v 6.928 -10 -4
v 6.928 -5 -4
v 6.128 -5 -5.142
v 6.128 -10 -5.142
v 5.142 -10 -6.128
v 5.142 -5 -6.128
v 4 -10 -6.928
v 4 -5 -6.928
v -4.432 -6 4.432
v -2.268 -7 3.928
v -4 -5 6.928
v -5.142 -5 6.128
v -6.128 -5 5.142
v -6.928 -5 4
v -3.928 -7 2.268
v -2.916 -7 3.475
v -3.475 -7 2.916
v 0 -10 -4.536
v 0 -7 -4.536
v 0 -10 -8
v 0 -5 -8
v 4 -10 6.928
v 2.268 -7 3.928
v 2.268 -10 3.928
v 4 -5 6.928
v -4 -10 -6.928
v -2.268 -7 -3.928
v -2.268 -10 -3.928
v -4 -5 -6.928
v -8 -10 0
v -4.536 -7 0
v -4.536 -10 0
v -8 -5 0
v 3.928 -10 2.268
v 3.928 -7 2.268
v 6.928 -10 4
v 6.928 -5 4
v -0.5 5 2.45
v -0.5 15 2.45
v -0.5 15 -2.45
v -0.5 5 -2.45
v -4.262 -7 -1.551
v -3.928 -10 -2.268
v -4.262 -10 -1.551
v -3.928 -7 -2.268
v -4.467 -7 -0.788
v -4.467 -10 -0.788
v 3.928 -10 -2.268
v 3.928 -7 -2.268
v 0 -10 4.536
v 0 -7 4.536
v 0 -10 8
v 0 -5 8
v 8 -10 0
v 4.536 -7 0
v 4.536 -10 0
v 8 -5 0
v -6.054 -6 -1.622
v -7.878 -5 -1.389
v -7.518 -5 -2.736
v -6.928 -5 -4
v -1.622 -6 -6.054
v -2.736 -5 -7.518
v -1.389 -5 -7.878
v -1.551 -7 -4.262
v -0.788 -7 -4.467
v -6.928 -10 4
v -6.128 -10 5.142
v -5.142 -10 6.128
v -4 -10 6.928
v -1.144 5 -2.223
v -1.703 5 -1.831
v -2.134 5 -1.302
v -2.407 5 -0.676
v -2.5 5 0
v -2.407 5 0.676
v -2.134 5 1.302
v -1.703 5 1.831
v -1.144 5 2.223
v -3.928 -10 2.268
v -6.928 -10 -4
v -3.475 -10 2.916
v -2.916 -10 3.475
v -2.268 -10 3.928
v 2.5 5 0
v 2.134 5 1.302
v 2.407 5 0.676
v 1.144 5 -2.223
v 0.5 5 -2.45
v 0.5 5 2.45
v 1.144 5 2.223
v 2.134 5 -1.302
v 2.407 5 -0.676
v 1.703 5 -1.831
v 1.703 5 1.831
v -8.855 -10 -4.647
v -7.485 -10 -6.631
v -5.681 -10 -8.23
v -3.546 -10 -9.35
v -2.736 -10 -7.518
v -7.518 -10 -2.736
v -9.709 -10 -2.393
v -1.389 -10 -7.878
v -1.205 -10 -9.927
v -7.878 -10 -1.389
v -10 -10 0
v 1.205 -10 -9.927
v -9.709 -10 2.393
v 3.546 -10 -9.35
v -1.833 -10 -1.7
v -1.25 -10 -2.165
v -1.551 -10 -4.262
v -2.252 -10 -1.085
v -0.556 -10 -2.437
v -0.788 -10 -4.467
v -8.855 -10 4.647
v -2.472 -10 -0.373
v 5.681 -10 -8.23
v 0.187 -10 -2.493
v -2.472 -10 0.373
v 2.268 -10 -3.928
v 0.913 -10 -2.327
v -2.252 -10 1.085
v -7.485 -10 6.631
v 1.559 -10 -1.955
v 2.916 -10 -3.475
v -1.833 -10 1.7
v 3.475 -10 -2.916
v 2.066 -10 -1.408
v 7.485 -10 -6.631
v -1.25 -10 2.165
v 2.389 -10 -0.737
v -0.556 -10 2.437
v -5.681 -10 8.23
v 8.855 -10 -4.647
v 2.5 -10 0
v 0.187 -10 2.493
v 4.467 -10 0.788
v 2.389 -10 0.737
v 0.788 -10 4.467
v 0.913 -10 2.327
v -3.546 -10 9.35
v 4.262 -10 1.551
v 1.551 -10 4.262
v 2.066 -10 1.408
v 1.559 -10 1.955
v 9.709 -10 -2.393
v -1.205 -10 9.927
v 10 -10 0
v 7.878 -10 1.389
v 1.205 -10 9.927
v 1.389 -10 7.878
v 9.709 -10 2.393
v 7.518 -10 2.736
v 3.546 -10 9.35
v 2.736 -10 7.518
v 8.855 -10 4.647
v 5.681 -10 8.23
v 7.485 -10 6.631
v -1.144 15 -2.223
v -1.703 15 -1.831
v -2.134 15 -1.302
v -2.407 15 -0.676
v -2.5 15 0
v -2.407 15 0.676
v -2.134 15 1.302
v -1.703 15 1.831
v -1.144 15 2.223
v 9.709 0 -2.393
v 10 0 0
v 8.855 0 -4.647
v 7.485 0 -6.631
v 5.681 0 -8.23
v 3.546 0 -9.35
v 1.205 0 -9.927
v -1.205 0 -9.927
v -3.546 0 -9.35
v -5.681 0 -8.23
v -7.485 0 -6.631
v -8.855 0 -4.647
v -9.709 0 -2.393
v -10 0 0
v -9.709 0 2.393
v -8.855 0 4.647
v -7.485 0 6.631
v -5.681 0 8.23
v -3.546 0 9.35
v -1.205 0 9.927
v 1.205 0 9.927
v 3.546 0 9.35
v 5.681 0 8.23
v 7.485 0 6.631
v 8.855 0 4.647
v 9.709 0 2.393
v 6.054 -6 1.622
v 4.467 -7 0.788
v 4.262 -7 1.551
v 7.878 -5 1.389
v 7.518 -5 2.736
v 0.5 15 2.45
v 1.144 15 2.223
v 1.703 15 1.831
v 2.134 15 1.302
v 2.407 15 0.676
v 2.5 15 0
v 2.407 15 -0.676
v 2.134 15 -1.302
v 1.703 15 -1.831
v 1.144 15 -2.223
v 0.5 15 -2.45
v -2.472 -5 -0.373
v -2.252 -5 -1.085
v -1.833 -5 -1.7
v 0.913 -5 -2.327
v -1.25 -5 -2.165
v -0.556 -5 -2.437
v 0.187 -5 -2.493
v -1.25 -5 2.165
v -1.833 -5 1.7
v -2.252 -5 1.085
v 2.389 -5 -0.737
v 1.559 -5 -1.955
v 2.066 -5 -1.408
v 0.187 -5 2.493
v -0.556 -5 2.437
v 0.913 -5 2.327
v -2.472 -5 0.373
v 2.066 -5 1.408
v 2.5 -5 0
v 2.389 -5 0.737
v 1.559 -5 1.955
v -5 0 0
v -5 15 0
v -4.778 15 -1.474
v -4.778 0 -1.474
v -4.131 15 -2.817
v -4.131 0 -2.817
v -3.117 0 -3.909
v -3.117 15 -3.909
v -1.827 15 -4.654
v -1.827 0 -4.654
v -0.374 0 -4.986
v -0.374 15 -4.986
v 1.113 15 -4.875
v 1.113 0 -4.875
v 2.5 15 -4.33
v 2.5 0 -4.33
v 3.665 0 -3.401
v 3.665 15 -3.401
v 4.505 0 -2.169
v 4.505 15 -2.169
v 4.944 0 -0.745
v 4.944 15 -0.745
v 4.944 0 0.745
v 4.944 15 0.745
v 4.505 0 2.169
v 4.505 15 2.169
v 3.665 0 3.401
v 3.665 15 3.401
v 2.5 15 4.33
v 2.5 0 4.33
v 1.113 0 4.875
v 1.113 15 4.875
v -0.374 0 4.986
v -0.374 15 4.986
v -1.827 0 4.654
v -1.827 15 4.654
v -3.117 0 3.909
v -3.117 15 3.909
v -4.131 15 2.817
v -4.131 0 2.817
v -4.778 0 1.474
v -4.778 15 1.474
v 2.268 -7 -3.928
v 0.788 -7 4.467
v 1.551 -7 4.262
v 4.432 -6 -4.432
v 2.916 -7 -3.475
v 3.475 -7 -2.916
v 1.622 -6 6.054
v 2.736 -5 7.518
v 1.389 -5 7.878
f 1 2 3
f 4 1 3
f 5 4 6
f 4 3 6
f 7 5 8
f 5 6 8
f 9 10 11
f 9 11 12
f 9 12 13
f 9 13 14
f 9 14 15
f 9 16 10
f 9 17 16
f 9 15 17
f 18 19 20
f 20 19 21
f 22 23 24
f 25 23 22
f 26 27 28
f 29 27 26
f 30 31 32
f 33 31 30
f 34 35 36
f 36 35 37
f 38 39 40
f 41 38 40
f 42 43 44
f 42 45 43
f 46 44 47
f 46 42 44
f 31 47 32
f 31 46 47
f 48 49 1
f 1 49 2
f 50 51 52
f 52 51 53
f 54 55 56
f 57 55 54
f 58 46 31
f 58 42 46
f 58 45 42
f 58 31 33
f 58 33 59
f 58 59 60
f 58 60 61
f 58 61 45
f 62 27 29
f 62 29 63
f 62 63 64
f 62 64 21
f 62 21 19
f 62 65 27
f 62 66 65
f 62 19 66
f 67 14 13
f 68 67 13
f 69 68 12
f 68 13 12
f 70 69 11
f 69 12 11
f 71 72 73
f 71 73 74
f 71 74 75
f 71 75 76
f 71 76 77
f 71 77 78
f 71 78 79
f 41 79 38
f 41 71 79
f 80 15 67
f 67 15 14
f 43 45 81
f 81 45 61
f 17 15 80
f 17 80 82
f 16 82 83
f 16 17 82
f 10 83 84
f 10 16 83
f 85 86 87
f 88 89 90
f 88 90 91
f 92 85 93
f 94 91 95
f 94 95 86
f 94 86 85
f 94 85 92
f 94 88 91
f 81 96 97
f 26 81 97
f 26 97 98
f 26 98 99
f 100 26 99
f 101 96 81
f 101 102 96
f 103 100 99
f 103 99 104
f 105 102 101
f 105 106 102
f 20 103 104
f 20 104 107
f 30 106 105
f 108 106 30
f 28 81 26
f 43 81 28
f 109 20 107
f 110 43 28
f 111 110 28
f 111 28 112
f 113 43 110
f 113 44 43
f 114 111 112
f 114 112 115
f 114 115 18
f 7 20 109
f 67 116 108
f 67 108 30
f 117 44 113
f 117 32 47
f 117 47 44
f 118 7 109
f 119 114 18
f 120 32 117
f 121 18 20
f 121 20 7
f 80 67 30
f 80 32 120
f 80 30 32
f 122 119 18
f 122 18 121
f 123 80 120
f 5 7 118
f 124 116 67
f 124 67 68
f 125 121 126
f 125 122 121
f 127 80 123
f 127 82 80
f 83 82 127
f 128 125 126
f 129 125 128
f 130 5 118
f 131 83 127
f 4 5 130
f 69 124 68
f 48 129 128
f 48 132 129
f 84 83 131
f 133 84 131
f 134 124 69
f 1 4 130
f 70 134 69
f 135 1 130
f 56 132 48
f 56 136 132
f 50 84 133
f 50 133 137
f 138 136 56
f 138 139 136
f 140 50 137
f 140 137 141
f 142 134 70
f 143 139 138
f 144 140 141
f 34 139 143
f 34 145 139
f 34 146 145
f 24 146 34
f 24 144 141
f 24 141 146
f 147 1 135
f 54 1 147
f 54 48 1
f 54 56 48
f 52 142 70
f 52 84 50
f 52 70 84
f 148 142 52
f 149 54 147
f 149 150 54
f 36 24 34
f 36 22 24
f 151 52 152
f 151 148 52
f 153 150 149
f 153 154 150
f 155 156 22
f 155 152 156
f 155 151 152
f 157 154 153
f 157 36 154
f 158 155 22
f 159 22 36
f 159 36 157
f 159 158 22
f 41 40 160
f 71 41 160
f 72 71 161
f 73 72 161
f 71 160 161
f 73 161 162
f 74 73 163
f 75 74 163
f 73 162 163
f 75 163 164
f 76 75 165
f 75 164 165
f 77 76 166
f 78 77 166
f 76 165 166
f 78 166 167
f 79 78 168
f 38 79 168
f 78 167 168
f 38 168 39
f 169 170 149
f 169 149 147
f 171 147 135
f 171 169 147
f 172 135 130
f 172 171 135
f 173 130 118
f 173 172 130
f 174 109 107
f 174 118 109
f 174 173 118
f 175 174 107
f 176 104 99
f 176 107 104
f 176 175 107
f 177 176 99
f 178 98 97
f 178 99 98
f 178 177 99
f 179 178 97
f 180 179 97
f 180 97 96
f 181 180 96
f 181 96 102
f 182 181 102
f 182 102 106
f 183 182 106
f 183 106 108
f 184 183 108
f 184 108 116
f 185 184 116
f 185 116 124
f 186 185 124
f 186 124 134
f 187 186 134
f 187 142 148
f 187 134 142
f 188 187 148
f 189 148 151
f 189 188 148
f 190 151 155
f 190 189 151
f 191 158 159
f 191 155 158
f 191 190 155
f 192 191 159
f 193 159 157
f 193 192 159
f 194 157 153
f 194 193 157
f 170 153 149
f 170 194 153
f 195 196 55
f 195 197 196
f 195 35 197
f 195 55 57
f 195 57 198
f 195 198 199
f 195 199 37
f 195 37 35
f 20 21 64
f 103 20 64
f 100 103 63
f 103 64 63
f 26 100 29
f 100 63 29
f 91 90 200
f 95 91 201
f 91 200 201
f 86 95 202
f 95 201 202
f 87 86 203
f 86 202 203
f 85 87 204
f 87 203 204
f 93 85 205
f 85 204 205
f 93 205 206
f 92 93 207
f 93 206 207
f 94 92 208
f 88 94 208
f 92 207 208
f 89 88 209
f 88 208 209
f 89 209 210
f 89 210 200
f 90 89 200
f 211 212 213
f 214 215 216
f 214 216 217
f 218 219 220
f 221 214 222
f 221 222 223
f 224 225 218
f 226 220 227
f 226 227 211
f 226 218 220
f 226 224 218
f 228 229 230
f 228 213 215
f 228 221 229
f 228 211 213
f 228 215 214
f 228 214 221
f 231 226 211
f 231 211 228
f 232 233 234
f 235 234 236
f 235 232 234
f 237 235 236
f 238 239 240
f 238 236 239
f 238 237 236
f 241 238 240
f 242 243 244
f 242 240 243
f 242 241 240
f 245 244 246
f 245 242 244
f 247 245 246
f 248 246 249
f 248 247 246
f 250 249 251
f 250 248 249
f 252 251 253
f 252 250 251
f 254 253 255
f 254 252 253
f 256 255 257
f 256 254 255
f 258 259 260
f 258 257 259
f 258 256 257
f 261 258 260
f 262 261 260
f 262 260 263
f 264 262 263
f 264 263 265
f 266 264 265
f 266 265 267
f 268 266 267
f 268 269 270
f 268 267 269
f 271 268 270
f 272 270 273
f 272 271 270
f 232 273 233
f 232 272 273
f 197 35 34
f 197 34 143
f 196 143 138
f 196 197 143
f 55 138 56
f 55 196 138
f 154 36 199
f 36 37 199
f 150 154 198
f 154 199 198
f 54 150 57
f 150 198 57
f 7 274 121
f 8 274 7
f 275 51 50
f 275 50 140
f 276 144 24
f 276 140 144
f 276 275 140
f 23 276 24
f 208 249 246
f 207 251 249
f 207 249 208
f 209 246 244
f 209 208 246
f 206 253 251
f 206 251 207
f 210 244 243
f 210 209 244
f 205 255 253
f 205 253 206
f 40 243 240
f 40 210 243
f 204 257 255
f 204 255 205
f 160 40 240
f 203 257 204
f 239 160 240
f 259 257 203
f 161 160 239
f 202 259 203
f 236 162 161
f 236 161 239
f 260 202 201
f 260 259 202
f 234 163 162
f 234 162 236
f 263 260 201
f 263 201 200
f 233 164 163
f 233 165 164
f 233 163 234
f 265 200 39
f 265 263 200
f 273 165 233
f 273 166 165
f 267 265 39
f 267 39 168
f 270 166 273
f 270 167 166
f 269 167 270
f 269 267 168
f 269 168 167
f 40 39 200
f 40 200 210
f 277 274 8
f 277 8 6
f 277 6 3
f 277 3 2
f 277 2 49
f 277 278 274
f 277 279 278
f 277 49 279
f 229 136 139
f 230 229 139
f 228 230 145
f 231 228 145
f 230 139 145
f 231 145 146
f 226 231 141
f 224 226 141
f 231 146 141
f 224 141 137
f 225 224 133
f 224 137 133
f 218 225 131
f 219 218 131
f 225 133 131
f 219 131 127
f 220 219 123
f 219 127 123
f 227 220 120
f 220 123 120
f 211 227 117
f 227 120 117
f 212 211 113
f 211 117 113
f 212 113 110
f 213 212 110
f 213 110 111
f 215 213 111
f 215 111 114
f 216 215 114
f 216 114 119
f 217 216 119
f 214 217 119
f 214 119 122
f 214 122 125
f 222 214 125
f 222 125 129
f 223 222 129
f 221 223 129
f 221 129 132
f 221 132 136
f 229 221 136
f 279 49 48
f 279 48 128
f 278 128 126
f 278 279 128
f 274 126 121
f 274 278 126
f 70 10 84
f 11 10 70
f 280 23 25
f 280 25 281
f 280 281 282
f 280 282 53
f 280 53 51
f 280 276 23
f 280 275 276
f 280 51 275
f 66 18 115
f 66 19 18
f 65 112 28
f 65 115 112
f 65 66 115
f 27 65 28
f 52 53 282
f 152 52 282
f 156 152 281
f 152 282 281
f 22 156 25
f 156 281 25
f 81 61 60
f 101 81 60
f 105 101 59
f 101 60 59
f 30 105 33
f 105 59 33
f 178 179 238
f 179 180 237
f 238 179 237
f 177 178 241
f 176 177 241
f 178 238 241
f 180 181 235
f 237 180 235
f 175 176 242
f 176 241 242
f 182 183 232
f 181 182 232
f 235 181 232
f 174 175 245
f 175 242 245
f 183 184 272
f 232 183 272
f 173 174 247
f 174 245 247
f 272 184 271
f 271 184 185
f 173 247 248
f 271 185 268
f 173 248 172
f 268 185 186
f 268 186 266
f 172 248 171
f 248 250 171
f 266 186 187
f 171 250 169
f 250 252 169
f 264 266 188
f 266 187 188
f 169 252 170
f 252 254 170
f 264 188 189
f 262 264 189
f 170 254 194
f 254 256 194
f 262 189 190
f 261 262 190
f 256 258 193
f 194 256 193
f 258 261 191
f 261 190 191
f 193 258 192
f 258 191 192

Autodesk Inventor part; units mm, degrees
ref_plane "YZ Plane" through (0, 0, 0) normal (1, 0, 0) x (0, 1, 0)
ref_plane "XZ Plane" through (0, 0, 0) normal (0, 1, 0) x (-1, 0, 0)
ref_plane "XY Plane" through (0, 0, 0) normal (0, 0, 1) x (1, 0, 0)
sketch "Sketch1" plane through (0, 0, 0) normal (0, 1, 0) x (-1, 0, 0)
  circle A0 centre (0, 0) radius 5
  dimension "d1" = 10
extrude "Extrusion1" add sketch "Sketch1" along normal blind 15
sketch "Sketch2" plane through (0, 15, 0) normal (0, 1, 0) x (1, 0, 0)
  circle A0 centre (0, 0) radius 2.5
  line L0 (0, 0) -> (-0.5, 0)
  line L1 (-0.5, 0) -> (-0.5, -2.4495)
  line L2 (-0.5, 0) -> (-0.5, 2.4495)
  line L3 (0, 0) -> (0, 2.5)
  line L4 (0.5, 0) -> (0.5, -2.4495)
  line L5 (0.5, 0) -> (0.5, 2.4495)
  dimension "d4" = 5
  dimension "d5" = 0.5
extrude "Extrusion2" cut sketch "Sketch2" against normal blind 10 contours A0 L4 L5 | A0 L2 L1
sketch "Sketch3" plane through (0, 0, 0) normal (0, -1, 0) x (1, 0, 0)
  circle A0 centre (0, 0) radius 10
  dimension "d8" = 20
extrude "Extrusion3" add sketch "Sketch3" along normal blind 10
sketch "Sketch5" plane through (0, -10, 0) normal (0, -1, 0) x (1, 0, 0)
  circle A0 centre (0, 0) radius 2.5
extrude "Extrusion4" cut sketch "Sketch5" against normal blind 5
sketch "Sketch6" plane through (0, 0, 0) normal (0, 0, 1) x (1, 0, 0)
  line L0 (-10, -10) -> (10, -10) projected
  line L1 (10, -10) -> (8, -10)
  line L2 (8, -10) -> (8, -5)
  line L3 (2.5359, -10) -> (4.5359, -10)
  line L4 (4.5359, -10) -> (4.5359, -5)
  line L5 (4.5359, -5) -> (8, -5)
  line L6 (8, -5) -> (4.5359, -7)
  line L7 (0, -15) -> (0, 20) projected
  point P0 (0, 0)
  dimension "d13" = 2
  dimension "d14" = 2
  dimension "d15" = 4
  dimension "d16" = 30
  dimension "d17" = 2
revolve "Revolution1" cut sketch "Sketch6" angle 30 about axis through (0, -10, 0) along (0, -1, 0) contours L4 L6 L2 L0
pattern_circular "Circular Pattern1" count 6 over 360 about axis through (0, -10, 0) along (0, 1, 0) of "Revolution1"
properties part number "pot başlık"
